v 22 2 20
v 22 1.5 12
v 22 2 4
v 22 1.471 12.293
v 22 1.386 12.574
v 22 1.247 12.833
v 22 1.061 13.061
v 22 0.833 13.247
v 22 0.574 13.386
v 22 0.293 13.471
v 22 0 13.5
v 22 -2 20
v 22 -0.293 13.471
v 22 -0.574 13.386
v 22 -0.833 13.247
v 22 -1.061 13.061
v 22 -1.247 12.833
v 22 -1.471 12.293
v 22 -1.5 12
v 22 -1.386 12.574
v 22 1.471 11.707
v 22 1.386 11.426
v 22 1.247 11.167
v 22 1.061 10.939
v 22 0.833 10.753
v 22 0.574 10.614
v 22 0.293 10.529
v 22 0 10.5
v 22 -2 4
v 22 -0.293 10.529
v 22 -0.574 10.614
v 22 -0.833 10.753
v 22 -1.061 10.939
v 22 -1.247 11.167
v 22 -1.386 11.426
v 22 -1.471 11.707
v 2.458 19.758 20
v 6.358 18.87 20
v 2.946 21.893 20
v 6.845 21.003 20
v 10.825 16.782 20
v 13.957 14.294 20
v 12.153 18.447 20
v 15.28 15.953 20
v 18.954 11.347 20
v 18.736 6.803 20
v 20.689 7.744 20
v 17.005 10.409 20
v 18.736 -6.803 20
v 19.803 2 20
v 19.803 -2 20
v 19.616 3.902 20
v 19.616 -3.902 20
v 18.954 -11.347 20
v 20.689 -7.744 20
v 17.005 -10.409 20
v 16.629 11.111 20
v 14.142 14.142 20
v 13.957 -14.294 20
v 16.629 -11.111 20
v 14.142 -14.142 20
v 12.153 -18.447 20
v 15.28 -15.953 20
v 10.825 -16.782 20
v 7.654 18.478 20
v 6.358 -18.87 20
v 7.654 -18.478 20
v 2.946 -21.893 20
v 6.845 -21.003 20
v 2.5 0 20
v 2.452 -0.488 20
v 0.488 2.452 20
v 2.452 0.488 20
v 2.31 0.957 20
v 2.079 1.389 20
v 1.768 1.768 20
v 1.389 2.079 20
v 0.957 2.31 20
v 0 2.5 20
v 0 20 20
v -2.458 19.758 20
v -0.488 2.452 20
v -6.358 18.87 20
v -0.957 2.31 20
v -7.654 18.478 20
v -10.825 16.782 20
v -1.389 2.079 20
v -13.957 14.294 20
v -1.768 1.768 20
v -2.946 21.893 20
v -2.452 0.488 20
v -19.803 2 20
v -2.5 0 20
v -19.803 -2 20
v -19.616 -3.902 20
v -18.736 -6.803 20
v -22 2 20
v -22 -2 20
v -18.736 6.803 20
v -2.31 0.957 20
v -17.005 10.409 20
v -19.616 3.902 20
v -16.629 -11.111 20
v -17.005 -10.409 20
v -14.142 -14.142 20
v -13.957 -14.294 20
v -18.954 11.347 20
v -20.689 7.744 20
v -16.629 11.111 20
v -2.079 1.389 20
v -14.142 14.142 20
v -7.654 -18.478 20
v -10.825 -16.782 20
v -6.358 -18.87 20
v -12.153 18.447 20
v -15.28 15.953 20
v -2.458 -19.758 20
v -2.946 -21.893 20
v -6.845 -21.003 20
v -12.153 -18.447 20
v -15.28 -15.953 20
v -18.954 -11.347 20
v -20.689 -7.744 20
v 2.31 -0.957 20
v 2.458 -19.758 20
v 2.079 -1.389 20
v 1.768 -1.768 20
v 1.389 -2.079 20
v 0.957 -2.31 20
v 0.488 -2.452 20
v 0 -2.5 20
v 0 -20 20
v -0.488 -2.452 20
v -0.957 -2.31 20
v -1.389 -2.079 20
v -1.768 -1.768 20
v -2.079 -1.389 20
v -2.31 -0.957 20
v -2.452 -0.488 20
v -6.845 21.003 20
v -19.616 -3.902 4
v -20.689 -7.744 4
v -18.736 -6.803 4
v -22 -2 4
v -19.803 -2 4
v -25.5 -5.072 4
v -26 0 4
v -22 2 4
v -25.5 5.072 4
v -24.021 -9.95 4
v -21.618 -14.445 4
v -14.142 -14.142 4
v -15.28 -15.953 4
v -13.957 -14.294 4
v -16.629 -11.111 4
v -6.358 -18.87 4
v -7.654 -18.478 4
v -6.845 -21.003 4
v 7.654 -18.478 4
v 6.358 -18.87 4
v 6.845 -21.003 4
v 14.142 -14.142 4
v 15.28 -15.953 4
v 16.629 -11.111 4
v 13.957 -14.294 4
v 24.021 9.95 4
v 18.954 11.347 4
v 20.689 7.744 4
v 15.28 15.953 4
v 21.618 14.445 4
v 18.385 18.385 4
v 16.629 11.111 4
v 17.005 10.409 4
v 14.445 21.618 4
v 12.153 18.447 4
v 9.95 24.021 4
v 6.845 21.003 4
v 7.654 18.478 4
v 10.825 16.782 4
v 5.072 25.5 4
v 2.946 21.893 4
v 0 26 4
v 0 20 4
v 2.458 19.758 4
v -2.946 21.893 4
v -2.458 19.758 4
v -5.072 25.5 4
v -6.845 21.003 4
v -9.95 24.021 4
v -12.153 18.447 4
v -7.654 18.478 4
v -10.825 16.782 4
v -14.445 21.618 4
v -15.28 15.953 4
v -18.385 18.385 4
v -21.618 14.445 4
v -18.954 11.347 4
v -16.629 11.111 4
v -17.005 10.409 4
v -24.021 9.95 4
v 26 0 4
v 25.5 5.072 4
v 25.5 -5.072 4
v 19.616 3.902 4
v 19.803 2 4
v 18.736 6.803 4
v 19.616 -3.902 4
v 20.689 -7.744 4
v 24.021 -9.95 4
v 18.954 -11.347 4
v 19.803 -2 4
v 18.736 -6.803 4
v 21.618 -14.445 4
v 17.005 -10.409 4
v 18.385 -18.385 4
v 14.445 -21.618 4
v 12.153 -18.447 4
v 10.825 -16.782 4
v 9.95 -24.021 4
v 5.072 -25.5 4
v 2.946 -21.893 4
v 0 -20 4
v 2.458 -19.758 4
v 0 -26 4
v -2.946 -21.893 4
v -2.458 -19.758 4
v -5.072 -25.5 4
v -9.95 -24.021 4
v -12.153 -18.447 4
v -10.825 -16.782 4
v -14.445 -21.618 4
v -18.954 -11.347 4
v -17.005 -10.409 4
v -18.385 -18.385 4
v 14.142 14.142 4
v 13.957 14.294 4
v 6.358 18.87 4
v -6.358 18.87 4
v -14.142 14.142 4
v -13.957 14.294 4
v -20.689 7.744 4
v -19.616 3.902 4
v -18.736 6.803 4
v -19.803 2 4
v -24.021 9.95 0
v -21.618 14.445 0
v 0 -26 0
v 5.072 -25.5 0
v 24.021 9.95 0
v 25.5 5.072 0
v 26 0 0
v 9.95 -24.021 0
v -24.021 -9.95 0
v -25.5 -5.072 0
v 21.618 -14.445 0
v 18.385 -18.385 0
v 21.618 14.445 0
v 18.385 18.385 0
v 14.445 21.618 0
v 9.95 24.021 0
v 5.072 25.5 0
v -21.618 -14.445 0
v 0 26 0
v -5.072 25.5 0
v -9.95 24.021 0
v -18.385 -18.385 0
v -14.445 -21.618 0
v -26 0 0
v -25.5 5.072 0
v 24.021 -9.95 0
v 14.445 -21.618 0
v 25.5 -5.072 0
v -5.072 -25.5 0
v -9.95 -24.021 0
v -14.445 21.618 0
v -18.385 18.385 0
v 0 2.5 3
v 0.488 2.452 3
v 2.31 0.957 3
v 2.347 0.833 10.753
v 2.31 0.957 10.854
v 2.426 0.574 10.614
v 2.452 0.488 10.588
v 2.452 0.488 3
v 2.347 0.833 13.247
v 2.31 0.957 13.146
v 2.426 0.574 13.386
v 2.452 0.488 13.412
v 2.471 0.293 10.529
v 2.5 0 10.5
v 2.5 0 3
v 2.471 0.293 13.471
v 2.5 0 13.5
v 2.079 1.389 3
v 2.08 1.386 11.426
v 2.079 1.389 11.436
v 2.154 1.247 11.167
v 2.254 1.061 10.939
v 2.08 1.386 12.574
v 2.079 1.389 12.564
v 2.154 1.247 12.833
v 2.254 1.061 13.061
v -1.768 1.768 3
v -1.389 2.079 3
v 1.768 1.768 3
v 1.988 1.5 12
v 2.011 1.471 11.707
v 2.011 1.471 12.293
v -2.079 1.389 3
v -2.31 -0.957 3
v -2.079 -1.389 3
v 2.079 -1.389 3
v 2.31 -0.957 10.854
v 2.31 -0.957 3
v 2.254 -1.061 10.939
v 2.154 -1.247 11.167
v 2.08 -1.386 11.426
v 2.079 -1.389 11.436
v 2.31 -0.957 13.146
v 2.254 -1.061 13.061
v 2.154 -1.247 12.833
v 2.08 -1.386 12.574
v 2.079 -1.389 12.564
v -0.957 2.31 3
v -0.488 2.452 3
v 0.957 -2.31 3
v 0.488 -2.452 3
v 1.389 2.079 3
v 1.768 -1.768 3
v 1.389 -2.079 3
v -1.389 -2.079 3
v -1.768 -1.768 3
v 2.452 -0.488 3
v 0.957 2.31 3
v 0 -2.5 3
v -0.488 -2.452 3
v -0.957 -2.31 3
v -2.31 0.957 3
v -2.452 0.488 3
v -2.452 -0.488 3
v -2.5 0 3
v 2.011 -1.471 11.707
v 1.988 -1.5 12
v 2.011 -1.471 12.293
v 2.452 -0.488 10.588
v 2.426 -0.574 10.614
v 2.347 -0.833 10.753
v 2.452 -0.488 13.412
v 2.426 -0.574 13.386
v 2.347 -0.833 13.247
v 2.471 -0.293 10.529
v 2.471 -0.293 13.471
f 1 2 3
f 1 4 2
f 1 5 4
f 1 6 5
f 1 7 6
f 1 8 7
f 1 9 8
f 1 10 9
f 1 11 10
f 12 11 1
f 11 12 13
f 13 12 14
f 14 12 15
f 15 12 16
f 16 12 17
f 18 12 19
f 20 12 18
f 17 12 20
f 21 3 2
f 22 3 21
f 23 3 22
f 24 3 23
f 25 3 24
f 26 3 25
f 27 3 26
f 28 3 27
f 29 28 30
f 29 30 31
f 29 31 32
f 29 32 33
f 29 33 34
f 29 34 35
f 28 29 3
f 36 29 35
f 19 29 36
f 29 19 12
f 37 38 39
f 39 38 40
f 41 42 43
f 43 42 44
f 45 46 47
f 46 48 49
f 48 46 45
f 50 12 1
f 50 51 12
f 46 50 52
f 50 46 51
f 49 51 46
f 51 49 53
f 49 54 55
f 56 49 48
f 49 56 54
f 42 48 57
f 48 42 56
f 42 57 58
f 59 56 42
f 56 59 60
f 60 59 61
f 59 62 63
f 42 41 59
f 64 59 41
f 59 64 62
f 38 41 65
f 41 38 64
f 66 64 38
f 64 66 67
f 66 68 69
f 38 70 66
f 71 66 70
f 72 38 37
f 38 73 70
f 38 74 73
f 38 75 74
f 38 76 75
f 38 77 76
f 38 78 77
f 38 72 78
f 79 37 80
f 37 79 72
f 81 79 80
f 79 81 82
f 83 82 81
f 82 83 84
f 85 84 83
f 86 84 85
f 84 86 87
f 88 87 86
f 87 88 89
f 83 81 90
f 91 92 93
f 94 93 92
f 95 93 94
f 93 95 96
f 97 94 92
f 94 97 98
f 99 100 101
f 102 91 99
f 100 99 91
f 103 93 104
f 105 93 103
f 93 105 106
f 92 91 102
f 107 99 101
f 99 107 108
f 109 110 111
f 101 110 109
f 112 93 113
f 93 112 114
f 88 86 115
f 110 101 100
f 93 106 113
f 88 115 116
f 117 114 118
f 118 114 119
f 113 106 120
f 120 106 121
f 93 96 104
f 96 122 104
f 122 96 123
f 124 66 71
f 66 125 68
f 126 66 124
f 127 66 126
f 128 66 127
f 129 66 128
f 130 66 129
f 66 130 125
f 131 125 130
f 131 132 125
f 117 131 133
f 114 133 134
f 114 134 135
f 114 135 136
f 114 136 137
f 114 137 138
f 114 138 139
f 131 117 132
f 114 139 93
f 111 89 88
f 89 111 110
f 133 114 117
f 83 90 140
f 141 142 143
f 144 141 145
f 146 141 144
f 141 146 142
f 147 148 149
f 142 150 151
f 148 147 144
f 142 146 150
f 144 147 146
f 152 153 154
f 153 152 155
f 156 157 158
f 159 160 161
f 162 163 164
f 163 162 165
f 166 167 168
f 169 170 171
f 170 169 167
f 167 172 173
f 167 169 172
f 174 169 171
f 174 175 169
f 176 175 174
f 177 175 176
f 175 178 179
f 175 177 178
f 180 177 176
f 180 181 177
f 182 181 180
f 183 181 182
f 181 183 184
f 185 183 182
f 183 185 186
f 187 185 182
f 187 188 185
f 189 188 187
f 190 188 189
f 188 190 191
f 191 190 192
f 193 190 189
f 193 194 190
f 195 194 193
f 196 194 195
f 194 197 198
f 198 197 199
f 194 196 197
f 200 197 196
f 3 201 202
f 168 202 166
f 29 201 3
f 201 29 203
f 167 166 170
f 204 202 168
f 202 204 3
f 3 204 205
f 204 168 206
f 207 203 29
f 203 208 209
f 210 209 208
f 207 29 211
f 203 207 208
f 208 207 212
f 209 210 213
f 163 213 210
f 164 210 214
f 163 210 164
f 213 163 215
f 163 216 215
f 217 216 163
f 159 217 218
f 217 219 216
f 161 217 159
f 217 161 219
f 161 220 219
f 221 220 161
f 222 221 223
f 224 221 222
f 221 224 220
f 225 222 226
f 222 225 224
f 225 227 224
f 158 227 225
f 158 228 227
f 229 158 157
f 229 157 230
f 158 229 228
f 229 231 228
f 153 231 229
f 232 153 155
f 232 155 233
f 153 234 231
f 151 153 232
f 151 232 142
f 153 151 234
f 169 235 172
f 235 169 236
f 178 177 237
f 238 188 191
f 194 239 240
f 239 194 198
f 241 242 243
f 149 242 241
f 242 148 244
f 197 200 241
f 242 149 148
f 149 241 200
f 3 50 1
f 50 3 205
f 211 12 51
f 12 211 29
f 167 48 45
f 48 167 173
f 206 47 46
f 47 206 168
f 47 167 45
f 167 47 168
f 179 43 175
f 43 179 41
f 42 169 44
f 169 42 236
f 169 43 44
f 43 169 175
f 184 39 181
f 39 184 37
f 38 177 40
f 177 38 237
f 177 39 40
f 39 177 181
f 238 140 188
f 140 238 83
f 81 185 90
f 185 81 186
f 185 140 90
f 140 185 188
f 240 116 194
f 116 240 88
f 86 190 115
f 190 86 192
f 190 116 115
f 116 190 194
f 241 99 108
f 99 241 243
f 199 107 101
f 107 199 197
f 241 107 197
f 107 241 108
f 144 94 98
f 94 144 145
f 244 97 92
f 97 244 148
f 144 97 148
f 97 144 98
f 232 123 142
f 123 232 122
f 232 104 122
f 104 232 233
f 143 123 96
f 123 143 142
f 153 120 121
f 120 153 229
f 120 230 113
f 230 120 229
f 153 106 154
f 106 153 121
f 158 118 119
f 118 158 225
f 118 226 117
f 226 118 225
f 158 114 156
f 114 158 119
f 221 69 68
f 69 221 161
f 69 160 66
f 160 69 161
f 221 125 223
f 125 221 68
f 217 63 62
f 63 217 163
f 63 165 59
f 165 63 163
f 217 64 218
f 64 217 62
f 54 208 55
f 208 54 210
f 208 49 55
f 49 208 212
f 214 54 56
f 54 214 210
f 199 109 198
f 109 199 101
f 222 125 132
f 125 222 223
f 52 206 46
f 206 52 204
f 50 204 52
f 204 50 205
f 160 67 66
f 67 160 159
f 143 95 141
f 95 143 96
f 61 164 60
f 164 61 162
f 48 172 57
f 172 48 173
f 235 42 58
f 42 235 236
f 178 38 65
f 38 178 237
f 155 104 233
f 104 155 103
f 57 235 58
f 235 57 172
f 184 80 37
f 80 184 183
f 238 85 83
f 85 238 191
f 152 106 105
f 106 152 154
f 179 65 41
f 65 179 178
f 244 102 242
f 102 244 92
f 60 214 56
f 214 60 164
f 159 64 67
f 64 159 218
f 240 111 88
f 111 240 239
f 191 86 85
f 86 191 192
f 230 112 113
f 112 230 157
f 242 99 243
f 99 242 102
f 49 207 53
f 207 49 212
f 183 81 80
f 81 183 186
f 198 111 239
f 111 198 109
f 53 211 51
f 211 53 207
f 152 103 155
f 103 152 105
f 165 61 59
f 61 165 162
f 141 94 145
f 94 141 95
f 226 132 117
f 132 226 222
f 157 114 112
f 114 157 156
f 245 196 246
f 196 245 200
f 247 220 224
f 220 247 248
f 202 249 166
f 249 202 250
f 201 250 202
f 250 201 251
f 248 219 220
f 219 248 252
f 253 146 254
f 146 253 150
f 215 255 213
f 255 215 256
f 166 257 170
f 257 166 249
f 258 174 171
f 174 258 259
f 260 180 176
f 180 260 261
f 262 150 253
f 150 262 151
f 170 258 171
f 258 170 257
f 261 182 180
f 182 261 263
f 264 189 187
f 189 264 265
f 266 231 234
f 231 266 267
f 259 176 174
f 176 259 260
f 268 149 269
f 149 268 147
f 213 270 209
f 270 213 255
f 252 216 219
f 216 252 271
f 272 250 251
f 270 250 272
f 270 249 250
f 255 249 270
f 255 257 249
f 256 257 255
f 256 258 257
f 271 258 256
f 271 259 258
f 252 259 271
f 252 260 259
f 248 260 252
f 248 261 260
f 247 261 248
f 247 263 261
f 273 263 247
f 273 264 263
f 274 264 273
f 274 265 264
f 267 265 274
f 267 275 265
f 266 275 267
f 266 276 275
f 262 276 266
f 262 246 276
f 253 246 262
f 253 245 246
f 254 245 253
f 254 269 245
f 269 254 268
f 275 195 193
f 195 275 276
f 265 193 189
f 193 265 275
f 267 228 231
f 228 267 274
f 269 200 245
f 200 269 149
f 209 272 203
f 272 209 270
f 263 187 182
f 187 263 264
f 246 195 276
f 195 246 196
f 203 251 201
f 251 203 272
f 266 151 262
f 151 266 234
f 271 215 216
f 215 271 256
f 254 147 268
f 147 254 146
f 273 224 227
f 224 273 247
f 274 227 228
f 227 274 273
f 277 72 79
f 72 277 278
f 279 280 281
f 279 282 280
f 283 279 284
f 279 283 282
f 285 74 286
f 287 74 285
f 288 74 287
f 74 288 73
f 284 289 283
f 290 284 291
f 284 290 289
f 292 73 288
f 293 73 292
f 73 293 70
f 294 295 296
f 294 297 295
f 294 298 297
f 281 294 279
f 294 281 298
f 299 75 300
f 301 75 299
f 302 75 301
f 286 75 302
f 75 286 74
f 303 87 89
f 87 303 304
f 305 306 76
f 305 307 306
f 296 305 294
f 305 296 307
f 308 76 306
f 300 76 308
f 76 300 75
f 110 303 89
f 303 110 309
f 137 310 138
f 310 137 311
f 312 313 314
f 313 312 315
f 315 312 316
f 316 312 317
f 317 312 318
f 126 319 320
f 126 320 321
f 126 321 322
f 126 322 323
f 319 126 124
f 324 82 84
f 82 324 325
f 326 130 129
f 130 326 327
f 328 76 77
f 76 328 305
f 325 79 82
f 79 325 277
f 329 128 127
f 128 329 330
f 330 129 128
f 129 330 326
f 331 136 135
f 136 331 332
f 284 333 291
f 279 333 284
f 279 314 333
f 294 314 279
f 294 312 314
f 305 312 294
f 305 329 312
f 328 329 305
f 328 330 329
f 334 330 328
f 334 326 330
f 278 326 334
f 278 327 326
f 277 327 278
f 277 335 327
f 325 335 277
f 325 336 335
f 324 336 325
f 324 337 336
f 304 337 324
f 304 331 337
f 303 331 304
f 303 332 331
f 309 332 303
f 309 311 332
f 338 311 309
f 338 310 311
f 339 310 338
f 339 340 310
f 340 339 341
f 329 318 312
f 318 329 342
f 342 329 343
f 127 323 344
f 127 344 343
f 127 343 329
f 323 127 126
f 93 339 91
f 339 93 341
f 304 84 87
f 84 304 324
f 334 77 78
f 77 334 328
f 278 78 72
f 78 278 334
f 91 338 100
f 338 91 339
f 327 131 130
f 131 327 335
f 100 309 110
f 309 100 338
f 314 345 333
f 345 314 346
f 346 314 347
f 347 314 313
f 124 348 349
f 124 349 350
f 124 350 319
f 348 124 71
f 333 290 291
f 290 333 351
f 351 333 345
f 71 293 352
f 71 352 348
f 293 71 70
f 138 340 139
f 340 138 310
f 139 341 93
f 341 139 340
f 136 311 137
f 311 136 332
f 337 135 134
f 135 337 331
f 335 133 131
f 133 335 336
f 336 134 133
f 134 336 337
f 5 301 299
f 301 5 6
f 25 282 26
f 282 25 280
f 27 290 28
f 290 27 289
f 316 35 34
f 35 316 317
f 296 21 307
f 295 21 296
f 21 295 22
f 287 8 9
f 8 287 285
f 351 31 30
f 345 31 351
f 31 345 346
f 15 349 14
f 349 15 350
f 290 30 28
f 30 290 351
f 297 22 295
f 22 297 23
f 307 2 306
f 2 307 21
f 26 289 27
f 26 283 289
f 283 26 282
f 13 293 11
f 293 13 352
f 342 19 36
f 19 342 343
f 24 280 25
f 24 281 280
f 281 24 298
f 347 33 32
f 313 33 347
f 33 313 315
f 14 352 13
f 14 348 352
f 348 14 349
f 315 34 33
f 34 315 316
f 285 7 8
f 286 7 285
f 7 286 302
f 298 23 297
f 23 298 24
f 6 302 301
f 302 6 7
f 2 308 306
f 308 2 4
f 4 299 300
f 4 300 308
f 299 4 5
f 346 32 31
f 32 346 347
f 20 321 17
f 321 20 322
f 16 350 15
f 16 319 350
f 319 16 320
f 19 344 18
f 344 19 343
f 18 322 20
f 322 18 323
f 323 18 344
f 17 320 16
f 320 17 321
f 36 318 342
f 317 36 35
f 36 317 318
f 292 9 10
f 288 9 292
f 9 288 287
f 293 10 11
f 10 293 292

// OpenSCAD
$fn = 32;

// ----------------------------------------------------------------------
// Control knob: skirt knob with grip ribs
// ----------------------------------------------------------------------

// --- parameters (mm) ---
skirt_d = 52;             // skirt diameter
skirt_t = 4;              // skirt thickness
rib_w = 4;                // grip rib width
rib_out = 3;              // grip rib radial protrusion
n_ribs = 14;              // number of grip ribs
knob_d = 40;              // knob body diameter
knob_h = 16;              // knob body height
bore_d = 5;               // shaft bore diameter
set_d = 3;                // set screw bore diameter

rib_step = 360 / n_ribs;  // rib angular step
total_h = skirt_t + knob_h;  // overall height

difference() {
  union() {
    translate([0, 0, skirt_t]) cylinder(h = knob_h, d = knob_d);
    cylinder(h = skirt_t, d = skirt_d);
    for (i = [0 : n_ribs - 1])
      rotate([0, 0, i * rib_step])
        translate([knob_d / 2 - 1, -rib_w / 2, skirt_t])
          cube([rib_out, rib_w, knob_h]);
  }
  translate([0, 0, skirt_t - 1]) cylinder(h = knob_h + 2, d = bore_d);
  translate([-1, 0, skirt_t + knob_h / 2]) rotate([0, 90, 0])
    cylinder(h = knob_d / 2 + bore_d / 2 + 2, d = set_d);
}
